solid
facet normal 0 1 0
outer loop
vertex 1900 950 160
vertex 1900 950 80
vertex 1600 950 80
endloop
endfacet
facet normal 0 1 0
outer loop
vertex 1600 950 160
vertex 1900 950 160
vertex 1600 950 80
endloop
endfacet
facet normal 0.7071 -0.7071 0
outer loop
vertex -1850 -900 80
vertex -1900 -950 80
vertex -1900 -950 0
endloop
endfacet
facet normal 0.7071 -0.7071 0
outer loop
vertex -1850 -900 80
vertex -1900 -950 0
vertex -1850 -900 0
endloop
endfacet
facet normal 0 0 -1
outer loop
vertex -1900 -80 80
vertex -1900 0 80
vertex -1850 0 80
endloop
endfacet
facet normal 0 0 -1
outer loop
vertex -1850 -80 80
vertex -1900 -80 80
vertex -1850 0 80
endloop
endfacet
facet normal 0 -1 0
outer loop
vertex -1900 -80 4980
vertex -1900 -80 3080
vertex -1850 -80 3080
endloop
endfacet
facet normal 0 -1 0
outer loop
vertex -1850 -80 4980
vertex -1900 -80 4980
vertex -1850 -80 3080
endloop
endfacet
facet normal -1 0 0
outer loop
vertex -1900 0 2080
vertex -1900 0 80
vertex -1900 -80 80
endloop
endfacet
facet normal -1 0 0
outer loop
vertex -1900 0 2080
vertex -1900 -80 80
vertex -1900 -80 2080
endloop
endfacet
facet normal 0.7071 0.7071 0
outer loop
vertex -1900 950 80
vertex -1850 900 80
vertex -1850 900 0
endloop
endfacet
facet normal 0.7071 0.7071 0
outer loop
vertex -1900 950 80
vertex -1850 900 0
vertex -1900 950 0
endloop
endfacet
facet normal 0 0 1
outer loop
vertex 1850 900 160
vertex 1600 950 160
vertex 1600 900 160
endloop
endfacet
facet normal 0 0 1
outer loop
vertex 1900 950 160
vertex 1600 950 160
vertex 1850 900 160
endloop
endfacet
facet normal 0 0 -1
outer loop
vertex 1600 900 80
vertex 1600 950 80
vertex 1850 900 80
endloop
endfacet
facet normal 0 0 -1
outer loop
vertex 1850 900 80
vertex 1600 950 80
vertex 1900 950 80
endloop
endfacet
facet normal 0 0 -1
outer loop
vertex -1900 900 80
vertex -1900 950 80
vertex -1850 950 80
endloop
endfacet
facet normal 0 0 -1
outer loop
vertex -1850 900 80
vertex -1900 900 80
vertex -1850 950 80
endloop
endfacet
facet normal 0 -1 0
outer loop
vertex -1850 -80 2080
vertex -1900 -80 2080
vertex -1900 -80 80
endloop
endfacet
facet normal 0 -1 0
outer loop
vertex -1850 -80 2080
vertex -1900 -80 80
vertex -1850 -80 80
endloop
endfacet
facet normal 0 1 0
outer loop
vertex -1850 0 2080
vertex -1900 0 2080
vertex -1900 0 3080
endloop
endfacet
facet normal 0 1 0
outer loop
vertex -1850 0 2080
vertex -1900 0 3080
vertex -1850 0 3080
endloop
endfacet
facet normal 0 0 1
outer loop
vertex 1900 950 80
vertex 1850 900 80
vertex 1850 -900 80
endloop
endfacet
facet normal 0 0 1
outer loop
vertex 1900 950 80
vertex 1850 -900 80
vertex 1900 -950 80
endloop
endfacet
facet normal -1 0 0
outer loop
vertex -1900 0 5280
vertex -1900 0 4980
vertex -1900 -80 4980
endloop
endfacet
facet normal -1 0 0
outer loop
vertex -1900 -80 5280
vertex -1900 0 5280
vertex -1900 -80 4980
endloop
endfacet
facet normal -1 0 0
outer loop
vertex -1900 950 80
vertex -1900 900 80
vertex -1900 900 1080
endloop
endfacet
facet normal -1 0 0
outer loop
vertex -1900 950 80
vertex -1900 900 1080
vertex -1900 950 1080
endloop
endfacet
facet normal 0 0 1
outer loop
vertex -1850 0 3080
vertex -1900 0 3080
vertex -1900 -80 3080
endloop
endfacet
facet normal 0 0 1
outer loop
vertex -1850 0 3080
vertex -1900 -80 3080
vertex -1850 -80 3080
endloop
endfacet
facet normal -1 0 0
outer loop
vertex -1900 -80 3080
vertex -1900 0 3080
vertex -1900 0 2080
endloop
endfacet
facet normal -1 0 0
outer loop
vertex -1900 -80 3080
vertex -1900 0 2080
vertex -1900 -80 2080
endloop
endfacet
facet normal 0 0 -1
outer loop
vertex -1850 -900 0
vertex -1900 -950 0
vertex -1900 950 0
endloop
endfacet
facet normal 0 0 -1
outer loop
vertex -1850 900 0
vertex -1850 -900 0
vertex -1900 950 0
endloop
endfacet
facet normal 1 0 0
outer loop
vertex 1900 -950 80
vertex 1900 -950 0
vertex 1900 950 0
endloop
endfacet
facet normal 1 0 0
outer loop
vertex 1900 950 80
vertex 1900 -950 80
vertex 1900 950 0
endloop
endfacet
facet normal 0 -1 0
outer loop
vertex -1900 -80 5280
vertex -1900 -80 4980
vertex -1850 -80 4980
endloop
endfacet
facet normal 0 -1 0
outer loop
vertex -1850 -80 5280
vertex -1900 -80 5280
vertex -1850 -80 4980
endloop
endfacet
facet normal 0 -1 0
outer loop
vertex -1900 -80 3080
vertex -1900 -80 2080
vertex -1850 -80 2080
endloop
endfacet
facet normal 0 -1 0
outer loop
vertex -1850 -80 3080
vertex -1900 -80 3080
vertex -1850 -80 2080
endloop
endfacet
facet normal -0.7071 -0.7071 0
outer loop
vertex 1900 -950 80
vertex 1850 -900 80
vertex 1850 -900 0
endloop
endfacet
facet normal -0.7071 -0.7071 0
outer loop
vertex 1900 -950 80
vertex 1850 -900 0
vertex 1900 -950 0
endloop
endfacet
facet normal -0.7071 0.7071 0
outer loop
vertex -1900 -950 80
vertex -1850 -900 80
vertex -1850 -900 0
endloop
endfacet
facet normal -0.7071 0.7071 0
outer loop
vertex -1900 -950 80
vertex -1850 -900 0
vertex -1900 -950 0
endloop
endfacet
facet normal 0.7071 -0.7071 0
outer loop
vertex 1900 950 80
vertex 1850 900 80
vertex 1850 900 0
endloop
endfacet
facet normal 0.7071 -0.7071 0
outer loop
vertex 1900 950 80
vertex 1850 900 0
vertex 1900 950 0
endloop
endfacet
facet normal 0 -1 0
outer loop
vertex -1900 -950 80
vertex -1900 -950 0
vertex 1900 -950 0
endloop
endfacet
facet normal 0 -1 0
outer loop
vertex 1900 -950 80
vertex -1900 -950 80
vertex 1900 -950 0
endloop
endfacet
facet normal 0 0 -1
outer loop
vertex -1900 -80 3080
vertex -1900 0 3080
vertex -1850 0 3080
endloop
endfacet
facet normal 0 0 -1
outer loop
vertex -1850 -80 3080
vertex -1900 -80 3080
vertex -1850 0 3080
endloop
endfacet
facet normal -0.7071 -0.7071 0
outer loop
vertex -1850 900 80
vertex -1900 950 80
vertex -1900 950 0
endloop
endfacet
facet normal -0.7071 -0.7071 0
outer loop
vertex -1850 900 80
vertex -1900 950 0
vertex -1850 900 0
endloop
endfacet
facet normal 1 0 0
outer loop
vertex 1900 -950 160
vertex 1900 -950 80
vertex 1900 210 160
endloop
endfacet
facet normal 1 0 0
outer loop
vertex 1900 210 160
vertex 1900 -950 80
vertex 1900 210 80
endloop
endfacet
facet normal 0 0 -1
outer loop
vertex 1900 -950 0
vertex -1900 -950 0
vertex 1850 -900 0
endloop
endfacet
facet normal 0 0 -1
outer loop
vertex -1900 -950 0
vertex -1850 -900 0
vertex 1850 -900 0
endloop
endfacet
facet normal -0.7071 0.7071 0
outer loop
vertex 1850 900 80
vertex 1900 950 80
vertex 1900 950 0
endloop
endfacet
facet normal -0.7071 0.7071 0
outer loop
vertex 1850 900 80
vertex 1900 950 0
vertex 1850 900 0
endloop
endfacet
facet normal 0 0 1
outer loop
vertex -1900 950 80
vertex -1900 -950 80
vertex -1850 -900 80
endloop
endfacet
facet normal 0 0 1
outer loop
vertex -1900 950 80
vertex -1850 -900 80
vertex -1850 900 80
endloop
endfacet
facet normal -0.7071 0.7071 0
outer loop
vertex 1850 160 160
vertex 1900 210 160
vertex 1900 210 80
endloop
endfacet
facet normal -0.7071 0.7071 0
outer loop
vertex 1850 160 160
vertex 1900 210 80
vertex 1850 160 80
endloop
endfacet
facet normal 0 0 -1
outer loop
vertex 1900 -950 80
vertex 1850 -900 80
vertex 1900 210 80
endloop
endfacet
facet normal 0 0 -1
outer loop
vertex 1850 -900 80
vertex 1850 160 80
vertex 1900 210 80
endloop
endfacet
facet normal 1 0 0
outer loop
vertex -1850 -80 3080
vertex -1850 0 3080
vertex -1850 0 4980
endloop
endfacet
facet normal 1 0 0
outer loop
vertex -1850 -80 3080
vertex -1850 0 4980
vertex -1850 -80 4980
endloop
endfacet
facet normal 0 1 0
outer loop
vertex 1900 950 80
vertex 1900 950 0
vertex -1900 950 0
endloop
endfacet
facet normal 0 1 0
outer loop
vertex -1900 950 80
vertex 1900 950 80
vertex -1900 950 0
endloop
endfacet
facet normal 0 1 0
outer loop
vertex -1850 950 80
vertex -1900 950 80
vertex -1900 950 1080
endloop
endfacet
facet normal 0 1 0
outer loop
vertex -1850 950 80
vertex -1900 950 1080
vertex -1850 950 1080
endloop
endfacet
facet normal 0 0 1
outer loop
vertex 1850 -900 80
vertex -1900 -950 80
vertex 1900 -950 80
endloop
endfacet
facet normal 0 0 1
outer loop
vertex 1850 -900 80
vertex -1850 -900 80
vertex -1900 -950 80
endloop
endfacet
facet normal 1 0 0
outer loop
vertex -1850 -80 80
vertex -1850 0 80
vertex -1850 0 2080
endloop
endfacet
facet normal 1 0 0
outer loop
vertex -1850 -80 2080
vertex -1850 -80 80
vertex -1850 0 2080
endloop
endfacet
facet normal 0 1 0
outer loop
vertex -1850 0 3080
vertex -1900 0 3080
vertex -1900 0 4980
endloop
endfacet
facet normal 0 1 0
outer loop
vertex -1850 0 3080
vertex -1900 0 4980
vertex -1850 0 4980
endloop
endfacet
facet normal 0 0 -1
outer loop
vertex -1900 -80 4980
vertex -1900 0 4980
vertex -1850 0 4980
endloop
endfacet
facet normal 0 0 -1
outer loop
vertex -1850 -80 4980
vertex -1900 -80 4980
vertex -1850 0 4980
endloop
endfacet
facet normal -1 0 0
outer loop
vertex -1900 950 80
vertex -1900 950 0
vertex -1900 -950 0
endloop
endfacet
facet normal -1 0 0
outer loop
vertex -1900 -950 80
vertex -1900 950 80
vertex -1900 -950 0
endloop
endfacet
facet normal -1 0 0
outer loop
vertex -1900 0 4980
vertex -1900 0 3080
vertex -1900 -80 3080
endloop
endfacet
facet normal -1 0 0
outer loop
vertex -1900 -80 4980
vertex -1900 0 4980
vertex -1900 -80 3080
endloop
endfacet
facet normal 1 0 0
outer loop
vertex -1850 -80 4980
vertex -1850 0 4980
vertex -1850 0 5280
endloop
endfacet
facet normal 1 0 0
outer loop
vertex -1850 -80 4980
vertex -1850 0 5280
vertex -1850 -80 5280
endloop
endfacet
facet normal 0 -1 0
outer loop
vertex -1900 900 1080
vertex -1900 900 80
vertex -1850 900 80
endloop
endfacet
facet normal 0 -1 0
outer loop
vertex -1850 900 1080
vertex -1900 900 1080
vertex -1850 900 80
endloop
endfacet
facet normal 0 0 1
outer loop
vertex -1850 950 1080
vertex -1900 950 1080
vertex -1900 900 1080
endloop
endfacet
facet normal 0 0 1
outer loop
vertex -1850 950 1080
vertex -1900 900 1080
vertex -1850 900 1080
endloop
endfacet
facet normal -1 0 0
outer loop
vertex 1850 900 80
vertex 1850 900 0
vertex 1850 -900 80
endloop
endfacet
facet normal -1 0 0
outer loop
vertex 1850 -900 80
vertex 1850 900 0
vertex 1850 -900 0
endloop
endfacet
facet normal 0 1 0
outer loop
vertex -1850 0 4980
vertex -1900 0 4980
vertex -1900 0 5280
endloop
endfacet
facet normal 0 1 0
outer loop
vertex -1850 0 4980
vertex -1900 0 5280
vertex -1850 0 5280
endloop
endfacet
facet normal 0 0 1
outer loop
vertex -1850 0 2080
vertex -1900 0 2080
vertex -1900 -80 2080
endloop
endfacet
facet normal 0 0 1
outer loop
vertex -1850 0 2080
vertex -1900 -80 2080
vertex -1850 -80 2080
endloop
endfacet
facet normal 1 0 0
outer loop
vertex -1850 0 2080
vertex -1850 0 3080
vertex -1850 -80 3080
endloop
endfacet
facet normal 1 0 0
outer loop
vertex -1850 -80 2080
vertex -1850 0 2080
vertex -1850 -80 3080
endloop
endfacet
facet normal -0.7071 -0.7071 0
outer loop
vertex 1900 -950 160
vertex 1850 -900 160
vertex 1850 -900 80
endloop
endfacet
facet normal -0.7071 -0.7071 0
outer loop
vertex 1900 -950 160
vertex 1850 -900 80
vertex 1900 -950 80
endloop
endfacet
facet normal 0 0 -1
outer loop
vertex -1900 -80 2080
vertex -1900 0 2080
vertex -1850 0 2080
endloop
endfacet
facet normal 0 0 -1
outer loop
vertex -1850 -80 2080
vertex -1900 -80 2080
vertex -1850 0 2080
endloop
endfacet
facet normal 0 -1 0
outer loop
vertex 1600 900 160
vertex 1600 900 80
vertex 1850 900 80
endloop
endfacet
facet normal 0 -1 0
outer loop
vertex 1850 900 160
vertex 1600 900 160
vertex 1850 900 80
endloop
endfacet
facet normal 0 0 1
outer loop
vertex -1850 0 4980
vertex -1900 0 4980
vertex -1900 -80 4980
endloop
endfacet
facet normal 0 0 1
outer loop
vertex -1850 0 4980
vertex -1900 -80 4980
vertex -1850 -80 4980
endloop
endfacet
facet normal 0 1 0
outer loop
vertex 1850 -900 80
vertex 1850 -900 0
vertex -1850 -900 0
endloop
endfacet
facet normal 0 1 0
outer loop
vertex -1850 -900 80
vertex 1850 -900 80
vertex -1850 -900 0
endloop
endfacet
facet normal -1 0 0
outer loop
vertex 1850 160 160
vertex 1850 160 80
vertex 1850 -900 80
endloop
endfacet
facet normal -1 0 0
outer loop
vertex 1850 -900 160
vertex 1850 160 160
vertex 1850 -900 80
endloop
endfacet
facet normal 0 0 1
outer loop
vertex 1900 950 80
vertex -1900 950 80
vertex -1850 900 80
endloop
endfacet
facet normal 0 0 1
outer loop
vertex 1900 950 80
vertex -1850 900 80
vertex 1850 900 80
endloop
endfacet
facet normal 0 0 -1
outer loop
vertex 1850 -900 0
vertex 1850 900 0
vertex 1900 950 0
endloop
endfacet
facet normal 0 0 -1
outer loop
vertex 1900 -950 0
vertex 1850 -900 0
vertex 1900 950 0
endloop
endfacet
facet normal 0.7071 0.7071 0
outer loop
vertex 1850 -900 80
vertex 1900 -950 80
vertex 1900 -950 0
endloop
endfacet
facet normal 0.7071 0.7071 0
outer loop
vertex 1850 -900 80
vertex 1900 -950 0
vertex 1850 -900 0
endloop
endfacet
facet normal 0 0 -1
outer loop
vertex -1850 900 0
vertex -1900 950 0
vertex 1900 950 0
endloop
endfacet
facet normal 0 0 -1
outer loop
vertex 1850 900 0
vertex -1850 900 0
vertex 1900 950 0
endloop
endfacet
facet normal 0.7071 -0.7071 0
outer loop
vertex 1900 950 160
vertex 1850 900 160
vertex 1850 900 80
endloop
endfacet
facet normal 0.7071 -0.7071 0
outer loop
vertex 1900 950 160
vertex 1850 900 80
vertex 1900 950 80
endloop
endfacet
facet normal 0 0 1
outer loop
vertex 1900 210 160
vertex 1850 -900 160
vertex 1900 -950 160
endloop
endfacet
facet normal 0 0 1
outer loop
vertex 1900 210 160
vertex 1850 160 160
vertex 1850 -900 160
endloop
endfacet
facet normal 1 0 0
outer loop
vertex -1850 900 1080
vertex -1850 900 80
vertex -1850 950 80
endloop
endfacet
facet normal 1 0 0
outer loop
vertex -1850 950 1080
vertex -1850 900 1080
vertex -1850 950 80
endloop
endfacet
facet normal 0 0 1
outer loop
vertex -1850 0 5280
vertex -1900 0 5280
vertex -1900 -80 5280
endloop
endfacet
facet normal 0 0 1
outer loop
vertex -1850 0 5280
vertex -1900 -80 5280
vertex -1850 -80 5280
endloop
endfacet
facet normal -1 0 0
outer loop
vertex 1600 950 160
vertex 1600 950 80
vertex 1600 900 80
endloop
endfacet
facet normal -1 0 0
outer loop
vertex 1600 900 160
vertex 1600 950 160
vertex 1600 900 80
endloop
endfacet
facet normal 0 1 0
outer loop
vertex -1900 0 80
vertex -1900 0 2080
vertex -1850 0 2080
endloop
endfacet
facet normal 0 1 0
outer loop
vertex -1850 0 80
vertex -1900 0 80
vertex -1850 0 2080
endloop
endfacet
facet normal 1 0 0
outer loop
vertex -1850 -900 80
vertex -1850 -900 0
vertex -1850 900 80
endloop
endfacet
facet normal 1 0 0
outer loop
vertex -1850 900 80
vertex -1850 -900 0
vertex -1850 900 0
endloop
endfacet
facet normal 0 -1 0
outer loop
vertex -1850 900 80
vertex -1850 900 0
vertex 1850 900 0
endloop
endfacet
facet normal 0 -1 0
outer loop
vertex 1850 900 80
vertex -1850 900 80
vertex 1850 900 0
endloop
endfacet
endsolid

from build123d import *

# Parameters (mm, degrees)
F1_DEPTH  = 80
F2_DEPTH  = 80
F3_DEPTH  = 80
F4_DEPTH  = 80
F5_W      = 50
F5_H      = 2000
F6_DEPTH  = 80
F7_W      = 50
F7_H      = 50
F8_DEPTH  = 1000
F9_DEPTH  = 1000
F10_DEPTH = 1900
F11_DEPTH = 300
F13_DEPTH = 80
F15_DEPTH = 80


with BuildPart() as f1:
    # F0 (on Top) → F1 (new body)
    with BuildSketch(Plane.XY):
        Polygon((1850, 900), (1900, 950), (-1900, 950), (-1850, 900), align=None)
    extrude(amount=F1_DEPTH)


with BuildPart() as f2:
    # F0 (on Top) → F2 (new body)
    with BuildSketch(Plane.XY):
        Polygon((-1850, 900), (-1900, 950), (-1900, -950), (-1850, -900), align=None)
    extrude(amount=F2_DEPTH)


with BuildPart() as f3:
    # F0 (on Top) → F3 (new body)
    with BuildSketch(Plane.XY):
        Polygon((-1900, -950), (1900, -950), (1850, -900), (-1850, -900), align=None)
    extrude(amount=F3_DEPTH)


with BuildPart() as f4:
    # F0 (on Top) → F4 (new body)
    with BuildSketch(Plane.XY):
        Polygon((1900, -950), (1900, 950), (1850, 900), (1850, -900), align=None)
    extrude(amount=F4_DEPTH)


with BuildPart() as f6:
    # F5 (on Front) → F6 (new body)
    with BuildSketch(Plane.XZ):
        with Locations((-1875, 1080)):
            Rectangle(F5_W, F5_H)
    extrude(amount=F6_DEPTH)


with BuildPart() as f8:
    # F7 (on face) → F8 (new body)
    with BuildSketch(Plane.XY.offset(80)):
        with Locations((-1875, 925)):
            Rectangle(F7_W, F7_H)
    extrude(amount=F8_DEPTH)


with BuildPart() as f9:
    # F9 (new): a face of the model
    f9_faces = [f6.part.faces().sort_by_distance(p)[0] for p in [
        (-1875, -40, 2080),
    ]]
    extrude(f9_faces, amount=F9_DEPTH)


with BuildPart() as f10:
    # F10 (new): a face of the model
    f10_faces = [f9.part.faces().sort_by_distance(p)[0] for p in [
        (-1875, -40, 3080),
    ]]
    extrude(f10_faces, amount=F10_DEPTH)


with BuildPart() as f11:
    # F11 (new): a face of the model
    f11_faces = [f10.part.faces().sort_by_distance(p)[0] for p in [
        (-1875, -40, 4980),
    ]]
    extrude(f11_faces, amount=F11_DEPTH)


with BuildPart() as f13:
    # F12 (on face) → F13 (new body)
    with BuildSketch(Plane.XY.offset(80)):
        Polygon((1600, 900), (1850, 900), (1900, 950), (1600, 950), align=None)
    extrude(amount=F13_DEPTH)


with BuildPart() as f15:
    # F14 (on face) → F15 (new body)
    with BuildSketch(Plane.XY.offset(80)):
        Polygon((1850, -900), (1900, -950), (1900, 210), (1850, 160), align=None)
    extrude(amount=F15_DEPTH)


solid = Compound([f1.part, f2.part, f3.part, f4.part, f6.part, f8.part, f9.part, f10.part, f11.part, f13.part, f15.part])
